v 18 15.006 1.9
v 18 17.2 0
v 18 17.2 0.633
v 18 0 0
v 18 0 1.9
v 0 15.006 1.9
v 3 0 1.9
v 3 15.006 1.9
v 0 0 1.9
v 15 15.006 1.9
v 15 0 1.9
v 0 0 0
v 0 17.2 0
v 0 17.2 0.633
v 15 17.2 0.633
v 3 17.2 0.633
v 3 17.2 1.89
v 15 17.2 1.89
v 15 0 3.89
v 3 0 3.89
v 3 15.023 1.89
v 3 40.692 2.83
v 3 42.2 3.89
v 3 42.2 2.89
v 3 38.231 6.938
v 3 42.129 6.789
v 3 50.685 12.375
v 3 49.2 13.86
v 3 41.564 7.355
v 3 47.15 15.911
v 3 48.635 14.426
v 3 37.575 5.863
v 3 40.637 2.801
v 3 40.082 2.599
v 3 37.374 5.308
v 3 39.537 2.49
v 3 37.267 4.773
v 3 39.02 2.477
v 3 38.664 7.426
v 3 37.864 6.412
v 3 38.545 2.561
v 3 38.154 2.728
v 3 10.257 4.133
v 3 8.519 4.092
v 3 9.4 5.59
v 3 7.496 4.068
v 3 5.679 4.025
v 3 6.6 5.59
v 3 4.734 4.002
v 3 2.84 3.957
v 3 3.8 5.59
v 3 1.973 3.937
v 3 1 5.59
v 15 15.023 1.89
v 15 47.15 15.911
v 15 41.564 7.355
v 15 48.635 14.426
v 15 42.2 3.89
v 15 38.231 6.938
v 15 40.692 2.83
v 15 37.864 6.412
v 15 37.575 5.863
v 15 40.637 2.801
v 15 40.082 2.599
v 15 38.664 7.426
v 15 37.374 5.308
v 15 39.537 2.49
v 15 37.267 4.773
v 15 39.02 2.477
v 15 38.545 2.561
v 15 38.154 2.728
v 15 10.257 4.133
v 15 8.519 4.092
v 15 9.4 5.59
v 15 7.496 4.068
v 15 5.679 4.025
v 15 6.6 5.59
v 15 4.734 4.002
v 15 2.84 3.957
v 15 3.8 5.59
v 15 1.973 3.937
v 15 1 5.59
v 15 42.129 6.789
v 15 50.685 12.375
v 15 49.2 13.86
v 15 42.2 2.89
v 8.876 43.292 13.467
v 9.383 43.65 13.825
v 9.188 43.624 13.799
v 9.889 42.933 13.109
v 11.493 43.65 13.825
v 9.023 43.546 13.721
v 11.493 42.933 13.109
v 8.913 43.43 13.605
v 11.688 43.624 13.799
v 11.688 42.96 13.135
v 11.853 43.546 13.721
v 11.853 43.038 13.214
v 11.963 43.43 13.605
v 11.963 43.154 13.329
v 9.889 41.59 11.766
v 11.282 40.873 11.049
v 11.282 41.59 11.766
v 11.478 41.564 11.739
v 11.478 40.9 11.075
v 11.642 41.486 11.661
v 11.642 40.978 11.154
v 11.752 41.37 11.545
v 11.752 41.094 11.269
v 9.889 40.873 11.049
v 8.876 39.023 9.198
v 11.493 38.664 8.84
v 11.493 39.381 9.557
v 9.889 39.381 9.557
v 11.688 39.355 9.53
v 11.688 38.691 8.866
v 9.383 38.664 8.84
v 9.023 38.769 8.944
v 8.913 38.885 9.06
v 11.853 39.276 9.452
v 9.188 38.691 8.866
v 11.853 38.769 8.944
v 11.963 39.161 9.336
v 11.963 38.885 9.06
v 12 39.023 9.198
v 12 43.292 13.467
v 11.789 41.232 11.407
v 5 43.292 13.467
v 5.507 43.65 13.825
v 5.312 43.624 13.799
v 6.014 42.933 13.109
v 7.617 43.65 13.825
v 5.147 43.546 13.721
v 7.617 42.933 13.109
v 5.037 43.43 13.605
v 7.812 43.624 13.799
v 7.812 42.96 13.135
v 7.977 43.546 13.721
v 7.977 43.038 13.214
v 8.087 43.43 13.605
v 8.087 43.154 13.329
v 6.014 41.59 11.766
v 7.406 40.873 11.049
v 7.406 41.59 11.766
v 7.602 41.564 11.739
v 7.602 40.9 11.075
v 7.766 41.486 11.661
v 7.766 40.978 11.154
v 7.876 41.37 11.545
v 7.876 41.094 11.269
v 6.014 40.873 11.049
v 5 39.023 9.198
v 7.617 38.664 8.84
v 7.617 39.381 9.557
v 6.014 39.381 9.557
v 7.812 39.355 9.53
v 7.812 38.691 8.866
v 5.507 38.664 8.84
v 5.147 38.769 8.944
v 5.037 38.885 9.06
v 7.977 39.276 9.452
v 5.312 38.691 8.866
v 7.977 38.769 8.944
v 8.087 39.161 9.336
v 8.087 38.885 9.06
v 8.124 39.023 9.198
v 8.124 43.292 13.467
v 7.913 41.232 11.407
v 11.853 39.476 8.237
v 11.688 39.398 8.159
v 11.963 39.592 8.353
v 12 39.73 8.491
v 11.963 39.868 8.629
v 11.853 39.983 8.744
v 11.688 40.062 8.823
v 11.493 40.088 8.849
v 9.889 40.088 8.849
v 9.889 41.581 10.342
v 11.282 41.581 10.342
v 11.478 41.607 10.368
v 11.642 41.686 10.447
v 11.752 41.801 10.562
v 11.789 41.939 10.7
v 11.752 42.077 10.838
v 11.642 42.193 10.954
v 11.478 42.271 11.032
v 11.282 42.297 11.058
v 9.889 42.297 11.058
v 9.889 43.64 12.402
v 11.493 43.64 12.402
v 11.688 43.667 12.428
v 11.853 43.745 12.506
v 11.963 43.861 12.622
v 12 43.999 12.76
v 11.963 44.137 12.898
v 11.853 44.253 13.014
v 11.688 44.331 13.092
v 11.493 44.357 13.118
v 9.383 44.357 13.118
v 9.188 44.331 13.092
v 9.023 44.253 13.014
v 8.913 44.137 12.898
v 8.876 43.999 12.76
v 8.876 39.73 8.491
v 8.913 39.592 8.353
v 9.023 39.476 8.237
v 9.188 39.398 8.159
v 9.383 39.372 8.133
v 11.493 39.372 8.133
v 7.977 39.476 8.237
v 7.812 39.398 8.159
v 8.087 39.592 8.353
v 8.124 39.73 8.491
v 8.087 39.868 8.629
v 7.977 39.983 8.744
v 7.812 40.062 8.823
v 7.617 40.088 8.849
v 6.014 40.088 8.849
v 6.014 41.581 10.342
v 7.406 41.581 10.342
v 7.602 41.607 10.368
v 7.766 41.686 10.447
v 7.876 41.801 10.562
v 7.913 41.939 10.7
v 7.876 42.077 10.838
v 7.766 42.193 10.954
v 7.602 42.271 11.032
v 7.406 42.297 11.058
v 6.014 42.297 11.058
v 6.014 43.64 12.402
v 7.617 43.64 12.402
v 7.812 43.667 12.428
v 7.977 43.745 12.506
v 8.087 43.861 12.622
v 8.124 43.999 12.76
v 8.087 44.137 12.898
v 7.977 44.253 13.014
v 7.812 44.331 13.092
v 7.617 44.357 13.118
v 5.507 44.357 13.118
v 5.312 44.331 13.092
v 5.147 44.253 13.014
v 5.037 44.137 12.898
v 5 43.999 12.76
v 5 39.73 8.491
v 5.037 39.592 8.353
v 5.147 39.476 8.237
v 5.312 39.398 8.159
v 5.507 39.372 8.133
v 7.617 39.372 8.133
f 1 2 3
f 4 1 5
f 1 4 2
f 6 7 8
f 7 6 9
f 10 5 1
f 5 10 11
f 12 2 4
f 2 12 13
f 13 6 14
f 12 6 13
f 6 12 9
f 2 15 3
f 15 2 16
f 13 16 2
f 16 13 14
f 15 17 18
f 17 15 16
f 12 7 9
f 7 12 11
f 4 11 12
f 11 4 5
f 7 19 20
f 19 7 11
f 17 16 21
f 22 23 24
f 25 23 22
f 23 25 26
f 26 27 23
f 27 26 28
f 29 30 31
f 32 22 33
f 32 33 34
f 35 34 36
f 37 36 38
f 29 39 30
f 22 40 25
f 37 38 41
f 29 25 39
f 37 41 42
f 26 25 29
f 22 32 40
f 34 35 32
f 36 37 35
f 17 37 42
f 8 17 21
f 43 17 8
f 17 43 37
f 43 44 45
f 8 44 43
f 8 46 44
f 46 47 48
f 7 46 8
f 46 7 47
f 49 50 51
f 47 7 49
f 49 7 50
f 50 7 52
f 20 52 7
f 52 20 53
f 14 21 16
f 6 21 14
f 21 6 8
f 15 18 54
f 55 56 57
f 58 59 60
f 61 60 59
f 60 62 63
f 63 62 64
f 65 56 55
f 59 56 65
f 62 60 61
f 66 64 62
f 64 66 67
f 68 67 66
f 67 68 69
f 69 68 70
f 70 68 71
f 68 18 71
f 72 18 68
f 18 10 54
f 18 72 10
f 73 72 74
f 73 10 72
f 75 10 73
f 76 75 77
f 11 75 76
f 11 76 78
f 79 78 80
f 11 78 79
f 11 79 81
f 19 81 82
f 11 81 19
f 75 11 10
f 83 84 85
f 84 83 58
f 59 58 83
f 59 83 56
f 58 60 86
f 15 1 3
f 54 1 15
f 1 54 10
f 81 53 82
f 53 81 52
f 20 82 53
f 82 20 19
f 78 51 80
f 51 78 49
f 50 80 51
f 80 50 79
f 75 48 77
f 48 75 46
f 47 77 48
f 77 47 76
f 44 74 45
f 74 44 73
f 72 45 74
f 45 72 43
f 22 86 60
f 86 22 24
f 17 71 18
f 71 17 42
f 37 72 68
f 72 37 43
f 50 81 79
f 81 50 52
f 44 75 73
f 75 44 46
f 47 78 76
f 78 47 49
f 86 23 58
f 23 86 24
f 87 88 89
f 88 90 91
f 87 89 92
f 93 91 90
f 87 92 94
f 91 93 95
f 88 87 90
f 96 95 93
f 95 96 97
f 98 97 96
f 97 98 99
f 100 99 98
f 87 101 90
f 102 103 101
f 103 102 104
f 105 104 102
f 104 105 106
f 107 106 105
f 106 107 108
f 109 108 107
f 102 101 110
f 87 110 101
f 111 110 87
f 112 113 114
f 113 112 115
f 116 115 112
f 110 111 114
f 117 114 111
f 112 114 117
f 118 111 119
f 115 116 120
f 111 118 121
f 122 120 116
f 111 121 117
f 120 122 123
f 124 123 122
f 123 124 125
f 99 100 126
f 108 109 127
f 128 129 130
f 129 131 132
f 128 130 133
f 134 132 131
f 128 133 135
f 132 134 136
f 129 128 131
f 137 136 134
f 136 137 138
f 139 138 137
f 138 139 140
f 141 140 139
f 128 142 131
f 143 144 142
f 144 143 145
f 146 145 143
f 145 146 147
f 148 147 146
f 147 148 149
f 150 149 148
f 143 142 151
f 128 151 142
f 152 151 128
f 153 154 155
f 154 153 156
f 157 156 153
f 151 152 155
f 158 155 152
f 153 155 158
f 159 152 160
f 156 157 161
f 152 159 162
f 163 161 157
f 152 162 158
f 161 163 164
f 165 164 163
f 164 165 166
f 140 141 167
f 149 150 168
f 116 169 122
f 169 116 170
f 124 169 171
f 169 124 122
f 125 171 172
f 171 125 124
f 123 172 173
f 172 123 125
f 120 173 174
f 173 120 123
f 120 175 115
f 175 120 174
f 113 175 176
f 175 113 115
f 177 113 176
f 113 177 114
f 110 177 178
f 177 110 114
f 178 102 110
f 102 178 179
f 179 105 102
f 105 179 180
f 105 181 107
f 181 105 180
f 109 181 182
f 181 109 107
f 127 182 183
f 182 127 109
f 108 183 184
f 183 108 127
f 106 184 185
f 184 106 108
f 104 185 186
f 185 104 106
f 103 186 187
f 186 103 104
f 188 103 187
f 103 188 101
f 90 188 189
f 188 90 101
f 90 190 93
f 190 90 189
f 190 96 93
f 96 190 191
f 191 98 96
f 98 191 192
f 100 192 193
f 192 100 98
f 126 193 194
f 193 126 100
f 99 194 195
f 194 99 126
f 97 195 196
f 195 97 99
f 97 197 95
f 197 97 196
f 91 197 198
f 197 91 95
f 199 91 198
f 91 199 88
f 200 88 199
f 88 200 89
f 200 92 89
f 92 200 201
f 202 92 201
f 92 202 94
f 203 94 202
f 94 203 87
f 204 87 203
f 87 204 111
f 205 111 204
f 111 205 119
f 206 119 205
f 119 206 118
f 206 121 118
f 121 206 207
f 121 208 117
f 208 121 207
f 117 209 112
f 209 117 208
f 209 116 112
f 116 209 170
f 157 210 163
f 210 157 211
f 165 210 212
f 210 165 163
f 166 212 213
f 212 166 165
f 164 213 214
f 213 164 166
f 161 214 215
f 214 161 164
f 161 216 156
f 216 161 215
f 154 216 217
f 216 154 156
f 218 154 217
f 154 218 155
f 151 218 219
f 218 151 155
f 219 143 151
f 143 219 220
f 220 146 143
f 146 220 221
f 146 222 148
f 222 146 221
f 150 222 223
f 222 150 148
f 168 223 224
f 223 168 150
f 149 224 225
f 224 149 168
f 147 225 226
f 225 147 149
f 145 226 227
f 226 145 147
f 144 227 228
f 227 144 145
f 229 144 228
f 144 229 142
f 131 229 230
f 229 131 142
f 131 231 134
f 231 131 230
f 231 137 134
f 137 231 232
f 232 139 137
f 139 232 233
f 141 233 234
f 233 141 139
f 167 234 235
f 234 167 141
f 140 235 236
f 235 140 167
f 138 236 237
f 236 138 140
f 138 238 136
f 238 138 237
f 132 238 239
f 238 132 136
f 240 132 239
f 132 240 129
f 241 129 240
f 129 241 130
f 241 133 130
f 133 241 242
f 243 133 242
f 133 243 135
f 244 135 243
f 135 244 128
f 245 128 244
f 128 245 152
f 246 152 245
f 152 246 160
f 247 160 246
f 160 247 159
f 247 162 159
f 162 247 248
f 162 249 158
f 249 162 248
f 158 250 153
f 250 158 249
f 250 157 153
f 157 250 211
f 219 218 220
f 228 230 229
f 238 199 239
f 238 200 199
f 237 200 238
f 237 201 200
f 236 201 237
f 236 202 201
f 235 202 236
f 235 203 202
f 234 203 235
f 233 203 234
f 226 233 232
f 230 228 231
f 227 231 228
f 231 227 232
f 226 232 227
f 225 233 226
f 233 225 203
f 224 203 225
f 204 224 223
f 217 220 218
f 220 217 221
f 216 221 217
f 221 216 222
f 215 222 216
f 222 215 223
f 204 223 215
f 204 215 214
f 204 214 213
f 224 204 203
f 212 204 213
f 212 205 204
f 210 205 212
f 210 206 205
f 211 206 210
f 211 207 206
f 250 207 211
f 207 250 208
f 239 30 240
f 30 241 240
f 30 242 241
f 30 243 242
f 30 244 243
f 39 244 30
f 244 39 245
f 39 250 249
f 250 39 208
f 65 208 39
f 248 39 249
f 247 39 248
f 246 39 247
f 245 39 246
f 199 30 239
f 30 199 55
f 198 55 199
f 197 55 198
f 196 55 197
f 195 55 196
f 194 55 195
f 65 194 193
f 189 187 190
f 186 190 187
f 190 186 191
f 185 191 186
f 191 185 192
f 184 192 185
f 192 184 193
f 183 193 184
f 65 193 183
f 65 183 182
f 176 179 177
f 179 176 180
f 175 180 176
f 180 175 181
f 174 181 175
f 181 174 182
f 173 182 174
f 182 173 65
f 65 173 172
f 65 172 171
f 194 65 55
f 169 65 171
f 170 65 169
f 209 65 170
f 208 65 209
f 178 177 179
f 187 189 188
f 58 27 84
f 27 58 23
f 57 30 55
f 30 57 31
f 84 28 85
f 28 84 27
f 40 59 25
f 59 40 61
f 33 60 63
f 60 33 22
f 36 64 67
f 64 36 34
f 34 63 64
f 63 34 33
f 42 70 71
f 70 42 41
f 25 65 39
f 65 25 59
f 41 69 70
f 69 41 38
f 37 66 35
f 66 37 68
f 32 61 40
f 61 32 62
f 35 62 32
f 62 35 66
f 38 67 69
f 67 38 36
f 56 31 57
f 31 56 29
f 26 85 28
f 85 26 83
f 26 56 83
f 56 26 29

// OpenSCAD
// file: hotshoe_paper_clip.scad
hs_w      = 18.0;
hs_l      = 17.2;
hs_h      = 1.9; // 2
hs2_w     = 12;
//hs2_l     = hs_l+5;
hs2_h     = 2;
hs2_x_off = (hs_w-hs2_w)/2;
hs2_elev  = 1;
hs3_l     = 12;
hs3_h     = 5;
hs3_w     = 0.8;

module hotshoe(
    logofile="", logooffset=1,
    len=5
    ) {
    hs2_l = hs_l+len;
    union() {
        // lower hotshoe
        difference() {
            cube([hs_w, hs_l, hs_h]);
            translate([-1,hs_l,hs_h/3]) rotate([60,0,0]) cube([hs2_x_off+1, 10,10]);
            translate([hs2_x_off+hs2_w,hs_l,hs_h/3]) rotate([60,0,0]) cube([hs2_x_off+1, 10,10]);
        }
        // upper plate including grip
        translate([hs2_x_off, 0, hs_h-0.01]) {
            rotate([90,0,90])
            linear_extrude(height=hs2_w) {
                polygon(
                points=[[0,0], [hs2_l,0], [hs_l,0], [hs2_l,hs2_elev],[hs2_l,hs2_elev+hs2_h],
                //[hs_l,hs2_h],
                [0,hs2_h]],
                paths=[[0,1,2,3,4,5,6]]
                );
            }
            for ( i = [0:3]) {
                translate([hs2_w/2,1+2.8*(i),hs2_h]) scale([1,1,1.7]) rotate([45,0,0]) cube([hs2_w,sqrt(2), sqrt(2)], center=true);
            }
        }
        translate([hs2_x_off, hs2_l, hs_h+hs2_elev+hs2_h/2-0.01])
        rotate([45,0,0])
        difference() {
            union() {
                // Logo
                translate([logooffset,1,hs3_h-1]) linear_extrude(height=1+1) import(file=logofile);
                // clasp
                cube([hs2_w, hs3_l, hs3_h]);
                translate([0,0,hs3_h/2]) scale([1,1.5,1]) rotate([0,90,0]) cylinder(h=hs2_w, r=hs3_h/2, $fn=36);
            }
            translate([-1,2,(hs3_h-hs3_w)/2]) cube([hs2_w+2, hs3_l, hs3_w]);
        }
    }
}
// main file
include <hotshoe_paper_clip.scad>

hotshoe(logofile="EE.dxf", logooffset=2,len=25);
